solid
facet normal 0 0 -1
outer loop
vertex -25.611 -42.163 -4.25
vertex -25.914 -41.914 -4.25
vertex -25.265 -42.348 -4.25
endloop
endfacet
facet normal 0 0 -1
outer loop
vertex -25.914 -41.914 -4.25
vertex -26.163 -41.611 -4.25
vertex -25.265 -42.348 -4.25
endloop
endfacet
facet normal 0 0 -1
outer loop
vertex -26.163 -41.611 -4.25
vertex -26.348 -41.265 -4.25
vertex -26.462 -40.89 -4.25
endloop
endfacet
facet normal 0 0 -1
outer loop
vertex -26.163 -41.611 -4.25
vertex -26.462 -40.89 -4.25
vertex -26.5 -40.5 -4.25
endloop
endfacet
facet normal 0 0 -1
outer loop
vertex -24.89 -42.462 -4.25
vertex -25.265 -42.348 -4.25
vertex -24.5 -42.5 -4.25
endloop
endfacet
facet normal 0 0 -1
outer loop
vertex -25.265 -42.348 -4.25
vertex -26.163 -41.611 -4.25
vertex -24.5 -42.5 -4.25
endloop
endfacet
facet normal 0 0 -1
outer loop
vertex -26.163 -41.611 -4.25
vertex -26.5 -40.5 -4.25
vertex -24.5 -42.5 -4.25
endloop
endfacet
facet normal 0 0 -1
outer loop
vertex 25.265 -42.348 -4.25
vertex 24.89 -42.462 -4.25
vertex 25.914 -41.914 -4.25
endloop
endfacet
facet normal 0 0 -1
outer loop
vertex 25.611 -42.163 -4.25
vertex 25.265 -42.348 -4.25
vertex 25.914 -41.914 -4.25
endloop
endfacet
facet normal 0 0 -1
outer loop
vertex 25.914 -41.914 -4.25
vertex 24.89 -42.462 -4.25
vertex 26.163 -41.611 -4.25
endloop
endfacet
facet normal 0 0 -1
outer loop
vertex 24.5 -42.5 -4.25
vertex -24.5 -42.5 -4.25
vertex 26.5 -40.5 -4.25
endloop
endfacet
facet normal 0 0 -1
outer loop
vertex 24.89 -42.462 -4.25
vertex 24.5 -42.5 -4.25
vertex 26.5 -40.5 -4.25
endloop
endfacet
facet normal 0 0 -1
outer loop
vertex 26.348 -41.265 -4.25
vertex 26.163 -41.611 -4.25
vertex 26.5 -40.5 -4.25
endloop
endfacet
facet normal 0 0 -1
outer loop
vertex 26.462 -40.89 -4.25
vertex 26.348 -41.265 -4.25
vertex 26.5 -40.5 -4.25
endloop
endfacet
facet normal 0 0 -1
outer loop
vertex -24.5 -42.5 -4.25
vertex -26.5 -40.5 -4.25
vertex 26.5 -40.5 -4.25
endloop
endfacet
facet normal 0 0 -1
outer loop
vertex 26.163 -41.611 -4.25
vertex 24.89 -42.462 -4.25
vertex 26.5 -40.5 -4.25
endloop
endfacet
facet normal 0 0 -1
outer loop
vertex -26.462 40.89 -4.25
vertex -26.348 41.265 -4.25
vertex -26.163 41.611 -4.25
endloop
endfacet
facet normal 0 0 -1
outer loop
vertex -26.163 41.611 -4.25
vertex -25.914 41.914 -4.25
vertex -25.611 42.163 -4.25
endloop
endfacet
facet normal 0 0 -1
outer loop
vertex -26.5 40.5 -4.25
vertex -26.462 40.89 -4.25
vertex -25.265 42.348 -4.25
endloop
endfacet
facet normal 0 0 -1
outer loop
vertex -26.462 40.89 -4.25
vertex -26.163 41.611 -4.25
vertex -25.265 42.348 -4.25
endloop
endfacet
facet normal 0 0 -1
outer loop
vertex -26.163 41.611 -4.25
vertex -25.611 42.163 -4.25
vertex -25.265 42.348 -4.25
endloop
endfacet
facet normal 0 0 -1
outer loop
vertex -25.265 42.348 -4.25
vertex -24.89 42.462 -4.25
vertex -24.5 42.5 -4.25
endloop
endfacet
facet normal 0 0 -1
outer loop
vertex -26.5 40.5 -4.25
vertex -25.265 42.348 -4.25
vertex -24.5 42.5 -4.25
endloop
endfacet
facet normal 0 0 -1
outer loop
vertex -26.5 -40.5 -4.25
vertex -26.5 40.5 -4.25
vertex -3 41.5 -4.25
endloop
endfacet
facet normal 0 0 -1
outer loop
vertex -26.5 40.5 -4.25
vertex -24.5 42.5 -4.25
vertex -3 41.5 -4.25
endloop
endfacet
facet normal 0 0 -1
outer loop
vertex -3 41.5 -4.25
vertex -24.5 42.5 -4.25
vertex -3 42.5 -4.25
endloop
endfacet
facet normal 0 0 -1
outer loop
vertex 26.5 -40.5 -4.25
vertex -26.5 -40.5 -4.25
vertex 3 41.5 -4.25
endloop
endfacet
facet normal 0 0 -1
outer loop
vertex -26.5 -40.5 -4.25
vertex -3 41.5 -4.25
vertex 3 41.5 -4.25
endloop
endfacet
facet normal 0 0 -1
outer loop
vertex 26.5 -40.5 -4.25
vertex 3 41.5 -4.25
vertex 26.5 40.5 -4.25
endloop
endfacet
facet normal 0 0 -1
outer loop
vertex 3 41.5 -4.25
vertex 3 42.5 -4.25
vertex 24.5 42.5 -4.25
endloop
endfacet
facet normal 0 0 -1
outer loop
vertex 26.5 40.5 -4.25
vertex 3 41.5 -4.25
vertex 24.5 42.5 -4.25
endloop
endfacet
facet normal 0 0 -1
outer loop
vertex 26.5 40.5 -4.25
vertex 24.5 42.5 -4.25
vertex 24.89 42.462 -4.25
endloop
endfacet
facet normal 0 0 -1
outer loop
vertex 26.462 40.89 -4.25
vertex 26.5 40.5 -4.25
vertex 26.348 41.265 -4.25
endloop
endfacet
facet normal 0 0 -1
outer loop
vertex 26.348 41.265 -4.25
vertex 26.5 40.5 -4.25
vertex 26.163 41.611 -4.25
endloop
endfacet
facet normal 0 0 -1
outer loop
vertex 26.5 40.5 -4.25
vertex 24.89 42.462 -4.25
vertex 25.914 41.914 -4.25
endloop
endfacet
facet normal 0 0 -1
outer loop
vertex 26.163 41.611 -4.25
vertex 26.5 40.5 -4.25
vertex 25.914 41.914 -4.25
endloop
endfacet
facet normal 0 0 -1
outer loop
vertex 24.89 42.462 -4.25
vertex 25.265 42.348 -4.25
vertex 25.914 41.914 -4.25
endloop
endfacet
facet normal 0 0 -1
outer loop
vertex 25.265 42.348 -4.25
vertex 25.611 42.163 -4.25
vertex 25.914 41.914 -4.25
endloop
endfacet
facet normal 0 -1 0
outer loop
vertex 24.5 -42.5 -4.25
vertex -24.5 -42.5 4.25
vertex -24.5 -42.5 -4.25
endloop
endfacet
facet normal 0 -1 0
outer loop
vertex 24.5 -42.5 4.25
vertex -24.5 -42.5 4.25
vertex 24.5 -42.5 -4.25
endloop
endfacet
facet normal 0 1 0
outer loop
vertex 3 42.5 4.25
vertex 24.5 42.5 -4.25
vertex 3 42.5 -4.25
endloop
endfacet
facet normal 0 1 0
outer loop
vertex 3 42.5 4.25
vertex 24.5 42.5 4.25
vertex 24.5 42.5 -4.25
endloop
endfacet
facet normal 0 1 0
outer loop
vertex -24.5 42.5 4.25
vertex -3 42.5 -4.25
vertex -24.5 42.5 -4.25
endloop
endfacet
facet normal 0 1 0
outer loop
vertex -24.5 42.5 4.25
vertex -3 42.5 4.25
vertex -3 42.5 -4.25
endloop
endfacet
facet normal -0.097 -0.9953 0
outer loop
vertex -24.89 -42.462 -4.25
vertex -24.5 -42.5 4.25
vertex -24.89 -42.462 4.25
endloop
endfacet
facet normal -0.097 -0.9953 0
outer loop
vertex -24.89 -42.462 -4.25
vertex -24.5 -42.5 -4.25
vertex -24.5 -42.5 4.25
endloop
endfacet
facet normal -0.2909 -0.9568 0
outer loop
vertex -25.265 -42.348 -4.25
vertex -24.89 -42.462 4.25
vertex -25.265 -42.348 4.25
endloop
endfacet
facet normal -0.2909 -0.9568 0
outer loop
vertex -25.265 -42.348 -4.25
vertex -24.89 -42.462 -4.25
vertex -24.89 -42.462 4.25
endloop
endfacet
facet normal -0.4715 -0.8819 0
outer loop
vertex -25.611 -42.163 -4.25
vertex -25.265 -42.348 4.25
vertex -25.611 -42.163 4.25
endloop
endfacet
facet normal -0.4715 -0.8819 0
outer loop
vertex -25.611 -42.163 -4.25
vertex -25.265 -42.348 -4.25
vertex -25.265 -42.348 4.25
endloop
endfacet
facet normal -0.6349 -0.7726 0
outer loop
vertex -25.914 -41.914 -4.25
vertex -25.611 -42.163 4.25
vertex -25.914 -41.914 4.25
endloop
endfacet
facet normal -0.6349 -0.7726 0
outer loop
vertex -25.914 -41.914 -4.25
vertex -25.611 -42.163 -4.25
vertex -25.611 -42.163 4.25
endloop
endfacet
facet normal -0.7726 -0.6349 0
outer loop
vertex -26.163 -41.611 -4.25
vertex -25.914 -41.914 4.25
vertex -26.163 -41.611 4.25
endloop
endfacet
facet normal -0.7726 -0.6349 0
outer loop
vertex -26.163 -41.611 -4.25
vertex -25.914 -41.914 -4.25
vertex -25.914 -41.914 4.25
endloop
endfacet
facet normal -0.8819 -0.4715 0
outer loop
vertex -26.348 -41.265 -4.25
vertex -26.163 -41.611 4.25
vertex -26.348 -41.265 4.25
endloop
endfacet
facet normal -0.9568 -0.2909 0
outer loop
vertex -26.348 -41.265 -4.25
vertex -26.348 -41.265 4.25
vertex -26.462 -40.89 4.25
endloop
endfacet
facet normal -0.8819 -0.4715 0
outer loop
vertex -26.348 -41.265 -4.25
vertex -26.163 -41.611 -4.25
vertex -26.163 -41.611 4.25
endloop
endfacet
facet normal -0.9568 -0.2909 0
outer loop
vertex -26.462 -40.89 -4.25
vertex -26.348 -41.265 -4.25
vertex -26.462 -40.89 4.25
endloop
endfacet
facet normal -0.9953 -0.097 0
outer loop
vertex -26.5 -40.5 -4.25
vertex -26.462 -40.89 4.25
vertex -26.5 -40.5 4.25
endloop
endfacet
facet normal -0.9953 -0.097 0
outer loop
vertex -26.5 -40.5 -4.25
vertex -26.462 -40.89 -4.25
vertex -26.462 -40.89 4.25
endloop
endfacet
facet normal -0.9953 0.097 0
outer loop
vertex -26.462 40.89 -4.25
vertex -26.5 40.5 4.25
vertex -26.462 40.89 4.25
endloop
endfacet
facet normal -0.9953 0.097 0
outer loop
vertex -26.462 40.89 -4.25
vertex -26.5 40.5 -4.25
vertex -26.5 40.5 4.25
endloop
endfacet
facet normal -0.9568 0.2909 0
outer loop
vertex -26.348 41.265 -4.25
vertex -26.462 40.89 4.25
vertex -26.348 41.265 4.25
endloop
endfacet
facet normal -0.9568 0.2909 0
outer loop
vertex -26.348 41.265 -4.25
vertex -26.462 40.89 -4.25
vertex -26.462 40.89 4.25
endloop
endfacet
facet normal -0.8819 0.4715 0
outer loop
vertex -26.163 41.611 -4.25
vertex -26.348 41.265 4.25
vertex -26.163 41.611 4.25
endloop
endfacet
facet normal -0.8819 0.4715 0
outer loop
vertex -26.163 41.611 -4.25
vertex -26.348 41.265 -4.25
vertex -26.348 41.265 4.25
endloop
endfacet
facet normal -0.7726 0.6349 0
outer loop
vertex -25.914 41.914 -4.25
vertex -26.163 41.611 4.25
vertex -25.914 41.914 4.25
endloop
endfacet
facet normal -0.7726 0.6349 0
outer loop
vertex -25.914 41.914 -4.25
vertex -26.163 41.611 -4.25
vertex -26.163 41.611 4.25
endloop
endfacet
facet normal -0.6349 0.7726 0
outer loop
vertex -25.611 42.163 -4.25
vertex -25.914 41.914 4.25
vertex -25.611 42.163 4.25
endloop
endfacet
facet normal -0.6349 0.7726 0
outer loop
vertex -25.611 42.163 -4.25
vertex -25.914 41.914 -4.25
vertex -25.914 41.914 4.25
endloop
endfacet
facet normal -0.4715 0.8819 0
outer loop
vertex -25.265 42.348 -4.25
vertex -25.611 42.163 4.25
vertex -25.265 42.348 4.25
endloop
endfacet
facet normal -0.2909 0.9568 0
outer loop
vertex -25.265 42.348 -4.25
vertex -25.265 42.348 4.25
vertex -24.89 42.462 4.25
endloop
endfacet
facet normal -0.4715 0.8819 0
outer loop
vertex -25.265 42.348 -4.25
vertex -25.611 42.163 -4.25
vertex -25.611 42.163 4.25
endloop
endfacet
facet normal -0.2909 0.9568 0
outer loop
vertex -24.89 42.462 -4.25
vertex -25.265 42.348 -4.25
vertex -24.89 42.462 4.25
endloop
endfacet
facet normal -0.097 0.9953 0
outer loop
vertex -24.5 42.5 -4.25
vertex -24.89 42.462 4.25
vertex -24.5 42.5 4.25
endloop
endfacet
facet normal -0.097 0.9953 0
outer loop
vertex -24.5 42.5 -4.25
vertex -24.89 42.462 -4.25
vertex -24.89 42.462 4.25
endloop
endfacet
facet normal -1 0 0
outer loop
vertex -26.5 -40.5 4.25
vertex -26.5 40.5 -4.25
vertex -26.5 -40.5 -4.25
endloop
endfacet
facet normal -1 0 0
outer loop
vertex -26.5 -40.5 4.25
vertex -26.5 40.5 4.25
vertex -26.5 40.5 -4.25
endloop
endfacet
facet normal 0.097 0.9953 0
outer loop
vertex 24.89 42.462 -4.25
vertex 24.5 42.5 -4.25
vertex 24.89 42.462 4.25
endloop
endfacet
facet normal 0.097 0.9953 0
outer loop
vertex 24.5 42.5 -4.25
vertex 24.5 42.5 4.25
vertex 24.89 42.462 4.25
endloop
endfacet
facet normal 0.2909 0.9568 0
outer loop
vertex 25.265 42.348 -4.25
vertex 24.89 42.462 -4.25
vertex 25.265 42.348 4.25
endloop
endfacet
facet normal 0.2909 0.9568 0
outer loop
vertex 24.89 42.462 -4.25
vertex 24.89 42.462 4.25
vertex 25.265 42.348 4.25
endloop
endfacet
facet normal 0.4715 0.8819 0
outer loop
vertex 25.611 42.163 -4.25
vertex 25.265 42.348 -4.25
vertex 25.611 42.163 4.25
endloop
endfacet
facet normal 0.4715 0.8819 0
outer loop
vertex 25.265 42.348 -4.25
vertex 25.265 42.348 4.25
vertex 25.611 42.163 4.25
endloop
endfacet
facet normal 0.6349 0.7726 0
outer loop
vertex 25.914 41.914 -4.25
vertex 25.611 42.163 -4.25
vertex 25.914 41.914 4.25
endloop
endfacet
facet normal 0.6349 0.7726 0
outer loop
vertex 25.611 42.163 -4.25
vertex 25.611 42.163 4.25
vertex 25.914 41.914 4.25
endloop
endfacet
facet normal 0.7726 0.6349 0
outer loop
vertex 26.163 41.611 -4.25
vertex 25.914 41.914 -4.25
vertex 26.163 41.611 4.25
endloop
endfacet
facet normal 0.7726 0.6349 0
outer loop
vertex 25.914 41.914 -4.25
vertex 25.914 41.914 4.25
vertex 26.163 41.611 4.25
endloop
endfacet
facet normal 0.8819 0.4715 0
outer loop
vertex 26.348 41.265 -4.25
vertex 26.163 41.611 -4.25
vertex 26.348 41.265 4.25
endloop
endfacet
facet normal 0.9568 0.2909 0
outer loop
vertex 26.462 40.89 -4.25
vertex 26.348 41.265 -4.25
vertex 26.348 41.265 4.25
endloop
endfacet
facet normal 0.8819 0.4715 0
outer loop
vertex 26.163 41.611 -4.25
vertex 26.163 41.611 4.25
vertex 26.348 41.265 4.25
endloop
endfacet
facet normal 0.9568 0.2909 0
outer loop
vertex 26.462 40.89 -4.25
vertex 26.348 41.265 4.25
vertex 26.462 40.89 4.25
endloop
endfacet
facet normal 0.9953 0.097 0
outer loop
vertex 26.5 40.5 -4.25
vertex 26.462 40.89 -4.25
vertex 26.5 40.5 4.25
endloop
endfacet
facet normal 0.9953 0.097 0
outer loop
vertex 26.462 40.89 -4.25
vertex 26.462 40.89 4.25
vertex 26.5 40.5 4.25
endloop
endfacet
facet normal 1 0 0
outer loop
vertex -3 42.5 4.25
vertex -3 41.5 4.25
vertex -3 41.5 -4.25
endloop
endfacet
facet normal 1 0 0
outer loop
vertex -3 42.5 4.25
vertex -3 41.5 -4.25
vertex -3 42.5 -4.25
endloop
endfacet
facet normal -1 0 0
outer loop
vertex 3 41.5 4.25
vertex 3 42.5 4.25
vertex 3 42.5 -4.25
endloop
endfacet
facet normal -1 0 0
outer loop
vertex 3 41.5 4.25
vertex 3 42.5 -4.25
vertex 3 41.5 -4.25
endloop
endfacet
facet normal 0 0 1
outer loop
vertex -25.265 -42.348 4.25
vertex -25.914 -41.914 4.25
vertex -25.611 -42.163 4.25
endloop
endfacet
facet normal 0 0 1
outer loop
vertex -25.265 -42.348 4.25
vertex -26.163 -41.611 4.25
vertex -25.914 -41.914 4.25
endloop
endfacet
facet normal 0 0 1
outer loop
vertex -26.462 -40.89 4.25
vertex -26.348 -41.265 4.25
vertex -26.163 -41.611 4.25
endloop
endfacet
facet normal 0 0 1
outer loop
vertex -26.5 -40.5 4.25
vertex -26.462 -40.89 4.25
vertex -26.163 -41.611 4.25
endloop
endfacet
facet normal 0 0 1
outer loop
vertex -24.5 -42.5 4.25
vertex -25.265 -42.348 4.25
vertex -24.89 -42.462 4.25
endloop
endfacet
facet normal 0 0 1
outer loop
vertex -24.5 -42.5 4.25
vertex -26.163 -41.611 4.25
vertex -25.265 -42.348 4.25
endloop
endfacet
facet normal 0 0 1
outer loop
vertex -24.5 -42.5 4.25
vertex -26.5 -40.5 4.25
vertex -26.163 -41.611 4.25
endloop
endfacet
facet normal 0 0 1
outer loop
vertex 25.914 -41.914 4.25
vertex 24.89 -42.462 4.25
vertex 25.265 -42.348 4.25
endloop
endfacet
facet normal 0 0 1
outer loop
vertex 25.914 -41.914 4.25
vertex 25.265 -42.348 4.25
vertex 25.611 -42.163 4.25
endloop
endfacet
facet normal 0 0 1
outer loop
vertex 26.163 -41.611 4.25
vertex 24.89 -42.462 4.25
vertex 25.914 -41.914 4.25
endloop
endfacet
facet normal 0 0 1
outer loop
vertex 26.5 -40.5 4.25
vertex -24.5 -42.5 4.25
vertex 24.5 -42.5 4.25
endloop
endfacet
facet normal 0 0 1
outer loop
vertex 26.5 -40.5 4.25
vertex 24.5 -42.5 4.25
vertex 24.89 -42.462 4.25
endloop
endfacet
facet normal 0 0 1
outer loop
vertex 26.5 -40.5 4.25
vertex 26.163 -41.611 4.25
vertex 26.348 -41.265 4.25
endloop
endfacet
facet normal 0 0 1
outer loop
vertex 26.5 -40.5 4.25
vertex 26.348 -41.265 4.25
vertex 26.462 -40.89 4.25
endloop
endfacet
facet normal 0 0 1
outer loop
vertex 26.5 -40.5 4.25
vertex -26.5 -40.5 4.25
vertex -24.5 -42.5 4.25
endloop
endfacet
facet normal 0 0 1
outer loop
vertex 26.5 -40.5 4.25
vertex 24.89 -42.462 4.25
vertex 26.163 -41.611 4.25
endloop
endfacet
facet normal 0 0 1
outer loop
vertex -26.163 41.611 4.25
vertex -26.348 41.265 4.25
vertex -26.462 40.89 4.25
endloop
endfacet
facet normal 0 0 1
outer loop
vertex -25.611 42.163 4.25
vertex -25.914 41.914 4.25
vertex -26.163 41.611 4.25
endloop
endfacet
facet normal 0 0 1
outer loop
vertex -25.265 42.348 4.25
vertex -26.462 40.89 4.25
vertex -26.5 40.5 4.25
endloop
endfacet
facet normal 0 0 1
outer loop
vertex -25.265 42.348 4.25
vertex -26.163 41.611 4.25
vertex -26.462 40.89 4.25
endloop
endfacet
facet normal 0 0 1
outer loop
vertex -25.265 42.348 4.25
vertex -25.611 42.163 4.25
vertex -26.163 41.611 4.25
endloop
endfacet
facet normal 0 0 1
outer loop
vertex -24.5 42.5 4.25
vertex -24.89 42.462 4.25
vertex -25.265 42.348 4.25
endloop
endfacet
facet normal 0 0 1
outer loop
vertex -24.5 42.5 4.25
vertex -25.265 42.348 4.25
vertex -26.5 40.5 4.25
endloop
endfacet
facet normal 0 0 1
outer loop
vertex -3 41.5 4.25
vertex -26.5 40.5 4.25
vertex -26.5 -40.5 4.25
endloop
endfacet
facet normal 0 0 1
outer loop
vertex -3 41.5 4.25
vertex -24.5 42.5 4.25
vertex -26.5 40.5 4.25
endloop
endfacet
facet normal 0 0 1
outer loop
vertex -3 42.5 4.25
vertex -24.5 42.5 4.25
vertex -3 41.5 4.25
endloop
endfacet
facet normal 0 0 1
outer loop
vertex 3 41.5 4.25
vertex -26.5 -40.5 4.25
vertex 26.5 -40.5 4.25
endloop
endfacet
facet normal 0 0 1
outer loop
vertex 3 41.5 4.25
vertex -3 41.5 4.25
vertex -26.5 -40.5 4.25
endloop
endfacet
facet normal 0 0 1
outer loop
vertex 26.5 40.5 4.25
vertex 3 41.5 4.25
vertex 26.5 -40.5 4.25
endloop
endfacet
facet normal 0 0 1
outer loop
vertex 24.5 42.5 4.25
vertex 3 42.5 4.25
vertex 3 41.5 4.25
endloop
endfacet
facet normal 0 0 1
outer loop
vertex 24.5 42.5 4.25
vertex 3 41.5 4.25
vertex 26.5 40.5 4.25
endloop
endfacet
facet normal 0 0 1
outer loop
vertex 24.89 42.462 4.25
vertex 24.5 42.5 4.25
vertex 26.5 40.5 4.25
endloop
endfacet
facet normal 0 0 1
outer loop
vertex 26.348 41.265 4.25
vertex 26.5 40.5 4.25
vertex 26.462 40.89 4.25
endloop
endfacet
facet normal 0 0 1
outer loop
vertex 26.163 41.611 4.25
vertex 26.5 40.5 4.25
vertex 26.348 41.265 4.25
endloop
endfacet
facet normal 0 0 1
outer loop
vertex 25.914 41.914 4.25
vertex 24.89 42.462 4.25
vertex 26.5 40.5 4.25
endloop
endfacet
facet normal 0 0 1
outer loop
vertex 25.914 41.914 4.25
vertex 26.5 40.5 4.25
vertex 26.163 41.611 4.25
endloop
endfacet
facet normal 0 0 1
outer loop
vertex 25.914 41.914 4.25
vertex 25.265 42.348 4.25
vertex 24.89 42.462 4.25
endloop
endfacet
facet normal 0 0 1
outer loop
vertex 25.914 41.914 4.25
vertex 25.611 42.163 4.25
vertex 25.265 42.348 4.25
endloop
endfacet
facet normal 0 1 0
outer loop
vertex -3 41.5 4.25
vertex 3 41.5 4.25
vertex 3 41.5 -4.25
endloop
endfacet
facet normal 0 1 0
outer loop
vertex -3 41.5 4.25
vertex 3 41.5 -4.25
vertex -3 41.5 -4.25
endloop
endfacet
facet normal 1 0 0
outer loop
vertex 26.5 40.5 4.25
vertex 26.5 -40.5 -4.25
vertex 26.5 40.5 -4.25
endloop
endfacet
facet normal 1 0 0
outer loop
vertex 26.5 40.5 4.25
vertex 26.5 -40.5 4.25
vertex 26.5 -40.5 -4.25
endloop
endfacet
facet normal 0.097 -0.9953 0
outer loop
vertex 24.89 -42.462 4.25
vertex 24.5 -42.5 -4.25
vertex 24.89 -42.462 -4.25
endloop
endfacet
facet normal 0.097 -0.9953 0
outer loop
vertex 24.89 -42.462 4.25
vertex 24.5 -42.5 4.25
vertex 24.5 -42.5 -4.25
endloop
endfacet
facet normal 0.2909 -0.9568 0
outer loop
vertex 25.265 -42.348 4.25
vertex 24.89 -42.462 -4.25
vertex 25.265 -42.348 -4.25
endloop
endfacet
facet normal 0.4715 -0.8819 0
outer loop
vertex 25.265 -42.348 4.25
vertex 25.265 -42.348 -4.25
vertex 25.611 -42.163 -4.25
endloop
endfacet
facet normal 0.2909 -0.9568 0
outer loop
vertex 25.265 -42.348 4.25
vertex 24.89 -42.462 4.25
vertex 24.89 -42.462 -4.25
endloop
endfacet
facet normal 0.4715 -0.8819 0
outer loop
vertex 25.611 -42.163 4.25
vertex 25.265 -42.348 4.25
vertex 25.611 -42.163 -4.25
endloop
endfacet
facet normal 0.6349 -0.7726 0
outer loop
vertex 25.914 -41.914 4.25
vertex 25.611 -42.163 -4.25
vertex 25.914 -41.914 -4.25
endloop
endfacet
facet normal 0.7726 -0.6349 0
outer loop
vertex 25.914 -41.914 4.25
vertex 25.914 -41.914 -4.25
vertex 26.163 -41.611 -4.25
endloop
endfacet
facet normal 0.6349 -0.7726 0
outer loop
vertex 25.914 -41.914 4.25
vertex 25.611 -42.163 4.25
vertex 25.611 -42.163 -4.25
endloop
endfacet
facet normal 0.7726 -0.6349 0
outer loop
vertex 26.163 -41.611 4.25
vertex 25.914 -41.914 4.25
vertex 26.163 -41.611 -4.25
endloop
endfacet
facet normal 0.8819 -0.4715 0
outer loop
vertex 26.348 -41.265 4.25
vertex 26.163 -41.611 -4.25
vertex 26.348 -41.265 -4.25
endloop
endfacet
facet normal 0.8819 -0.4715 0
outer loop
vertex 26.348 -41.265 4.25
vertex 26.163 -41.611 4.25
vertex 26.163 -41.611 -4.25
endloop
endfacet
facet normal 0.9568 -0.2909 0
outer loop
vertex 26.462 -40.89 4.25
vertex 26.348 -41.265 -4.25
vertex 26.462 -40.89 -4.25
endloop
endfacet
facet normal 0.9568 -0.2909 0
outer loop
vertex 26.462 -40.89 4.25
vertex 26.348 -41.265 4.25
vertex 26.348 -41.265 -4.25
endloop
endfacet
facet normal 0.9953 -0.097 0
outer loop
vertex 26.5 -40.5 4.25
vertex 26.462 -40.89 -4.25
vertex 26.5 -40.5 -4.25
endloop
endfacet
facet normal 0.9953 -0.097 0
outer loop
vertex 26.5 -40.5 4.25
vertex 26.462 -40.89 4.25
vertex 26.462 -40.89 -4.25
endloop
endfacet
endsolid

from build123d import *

# Parameters (mm, degrees)
F1_DEPTH = 4.25
F2_R     = 2


with BuildPart() as f1:
    # F0 (on Top) → F1 (new body, symmetric)
    with BuildSketch(Plane.XY):
        Polygon((-26.5, -42.5), (26.5, -42.5), (26.5, 42.5), (3, 42.5), (3, 41.5), (-3, 41.5), (-3, 42.5), (-26.5, 42.5), align=None)
    extrude(amount=F1_DEPTH, both=True)

    # F2
    f2_edges = [f1.edges().sort_by_distance(p)[0] for p in [
        (-26.5, -42.5, 0),
        (26.5, -42.5, 0),
        (26.5, 42.5, 0),
        (-26.5, 42.5, 0),
    ]]
    fillet(f2_edges, radius=F2_R)


solid = f1.part
